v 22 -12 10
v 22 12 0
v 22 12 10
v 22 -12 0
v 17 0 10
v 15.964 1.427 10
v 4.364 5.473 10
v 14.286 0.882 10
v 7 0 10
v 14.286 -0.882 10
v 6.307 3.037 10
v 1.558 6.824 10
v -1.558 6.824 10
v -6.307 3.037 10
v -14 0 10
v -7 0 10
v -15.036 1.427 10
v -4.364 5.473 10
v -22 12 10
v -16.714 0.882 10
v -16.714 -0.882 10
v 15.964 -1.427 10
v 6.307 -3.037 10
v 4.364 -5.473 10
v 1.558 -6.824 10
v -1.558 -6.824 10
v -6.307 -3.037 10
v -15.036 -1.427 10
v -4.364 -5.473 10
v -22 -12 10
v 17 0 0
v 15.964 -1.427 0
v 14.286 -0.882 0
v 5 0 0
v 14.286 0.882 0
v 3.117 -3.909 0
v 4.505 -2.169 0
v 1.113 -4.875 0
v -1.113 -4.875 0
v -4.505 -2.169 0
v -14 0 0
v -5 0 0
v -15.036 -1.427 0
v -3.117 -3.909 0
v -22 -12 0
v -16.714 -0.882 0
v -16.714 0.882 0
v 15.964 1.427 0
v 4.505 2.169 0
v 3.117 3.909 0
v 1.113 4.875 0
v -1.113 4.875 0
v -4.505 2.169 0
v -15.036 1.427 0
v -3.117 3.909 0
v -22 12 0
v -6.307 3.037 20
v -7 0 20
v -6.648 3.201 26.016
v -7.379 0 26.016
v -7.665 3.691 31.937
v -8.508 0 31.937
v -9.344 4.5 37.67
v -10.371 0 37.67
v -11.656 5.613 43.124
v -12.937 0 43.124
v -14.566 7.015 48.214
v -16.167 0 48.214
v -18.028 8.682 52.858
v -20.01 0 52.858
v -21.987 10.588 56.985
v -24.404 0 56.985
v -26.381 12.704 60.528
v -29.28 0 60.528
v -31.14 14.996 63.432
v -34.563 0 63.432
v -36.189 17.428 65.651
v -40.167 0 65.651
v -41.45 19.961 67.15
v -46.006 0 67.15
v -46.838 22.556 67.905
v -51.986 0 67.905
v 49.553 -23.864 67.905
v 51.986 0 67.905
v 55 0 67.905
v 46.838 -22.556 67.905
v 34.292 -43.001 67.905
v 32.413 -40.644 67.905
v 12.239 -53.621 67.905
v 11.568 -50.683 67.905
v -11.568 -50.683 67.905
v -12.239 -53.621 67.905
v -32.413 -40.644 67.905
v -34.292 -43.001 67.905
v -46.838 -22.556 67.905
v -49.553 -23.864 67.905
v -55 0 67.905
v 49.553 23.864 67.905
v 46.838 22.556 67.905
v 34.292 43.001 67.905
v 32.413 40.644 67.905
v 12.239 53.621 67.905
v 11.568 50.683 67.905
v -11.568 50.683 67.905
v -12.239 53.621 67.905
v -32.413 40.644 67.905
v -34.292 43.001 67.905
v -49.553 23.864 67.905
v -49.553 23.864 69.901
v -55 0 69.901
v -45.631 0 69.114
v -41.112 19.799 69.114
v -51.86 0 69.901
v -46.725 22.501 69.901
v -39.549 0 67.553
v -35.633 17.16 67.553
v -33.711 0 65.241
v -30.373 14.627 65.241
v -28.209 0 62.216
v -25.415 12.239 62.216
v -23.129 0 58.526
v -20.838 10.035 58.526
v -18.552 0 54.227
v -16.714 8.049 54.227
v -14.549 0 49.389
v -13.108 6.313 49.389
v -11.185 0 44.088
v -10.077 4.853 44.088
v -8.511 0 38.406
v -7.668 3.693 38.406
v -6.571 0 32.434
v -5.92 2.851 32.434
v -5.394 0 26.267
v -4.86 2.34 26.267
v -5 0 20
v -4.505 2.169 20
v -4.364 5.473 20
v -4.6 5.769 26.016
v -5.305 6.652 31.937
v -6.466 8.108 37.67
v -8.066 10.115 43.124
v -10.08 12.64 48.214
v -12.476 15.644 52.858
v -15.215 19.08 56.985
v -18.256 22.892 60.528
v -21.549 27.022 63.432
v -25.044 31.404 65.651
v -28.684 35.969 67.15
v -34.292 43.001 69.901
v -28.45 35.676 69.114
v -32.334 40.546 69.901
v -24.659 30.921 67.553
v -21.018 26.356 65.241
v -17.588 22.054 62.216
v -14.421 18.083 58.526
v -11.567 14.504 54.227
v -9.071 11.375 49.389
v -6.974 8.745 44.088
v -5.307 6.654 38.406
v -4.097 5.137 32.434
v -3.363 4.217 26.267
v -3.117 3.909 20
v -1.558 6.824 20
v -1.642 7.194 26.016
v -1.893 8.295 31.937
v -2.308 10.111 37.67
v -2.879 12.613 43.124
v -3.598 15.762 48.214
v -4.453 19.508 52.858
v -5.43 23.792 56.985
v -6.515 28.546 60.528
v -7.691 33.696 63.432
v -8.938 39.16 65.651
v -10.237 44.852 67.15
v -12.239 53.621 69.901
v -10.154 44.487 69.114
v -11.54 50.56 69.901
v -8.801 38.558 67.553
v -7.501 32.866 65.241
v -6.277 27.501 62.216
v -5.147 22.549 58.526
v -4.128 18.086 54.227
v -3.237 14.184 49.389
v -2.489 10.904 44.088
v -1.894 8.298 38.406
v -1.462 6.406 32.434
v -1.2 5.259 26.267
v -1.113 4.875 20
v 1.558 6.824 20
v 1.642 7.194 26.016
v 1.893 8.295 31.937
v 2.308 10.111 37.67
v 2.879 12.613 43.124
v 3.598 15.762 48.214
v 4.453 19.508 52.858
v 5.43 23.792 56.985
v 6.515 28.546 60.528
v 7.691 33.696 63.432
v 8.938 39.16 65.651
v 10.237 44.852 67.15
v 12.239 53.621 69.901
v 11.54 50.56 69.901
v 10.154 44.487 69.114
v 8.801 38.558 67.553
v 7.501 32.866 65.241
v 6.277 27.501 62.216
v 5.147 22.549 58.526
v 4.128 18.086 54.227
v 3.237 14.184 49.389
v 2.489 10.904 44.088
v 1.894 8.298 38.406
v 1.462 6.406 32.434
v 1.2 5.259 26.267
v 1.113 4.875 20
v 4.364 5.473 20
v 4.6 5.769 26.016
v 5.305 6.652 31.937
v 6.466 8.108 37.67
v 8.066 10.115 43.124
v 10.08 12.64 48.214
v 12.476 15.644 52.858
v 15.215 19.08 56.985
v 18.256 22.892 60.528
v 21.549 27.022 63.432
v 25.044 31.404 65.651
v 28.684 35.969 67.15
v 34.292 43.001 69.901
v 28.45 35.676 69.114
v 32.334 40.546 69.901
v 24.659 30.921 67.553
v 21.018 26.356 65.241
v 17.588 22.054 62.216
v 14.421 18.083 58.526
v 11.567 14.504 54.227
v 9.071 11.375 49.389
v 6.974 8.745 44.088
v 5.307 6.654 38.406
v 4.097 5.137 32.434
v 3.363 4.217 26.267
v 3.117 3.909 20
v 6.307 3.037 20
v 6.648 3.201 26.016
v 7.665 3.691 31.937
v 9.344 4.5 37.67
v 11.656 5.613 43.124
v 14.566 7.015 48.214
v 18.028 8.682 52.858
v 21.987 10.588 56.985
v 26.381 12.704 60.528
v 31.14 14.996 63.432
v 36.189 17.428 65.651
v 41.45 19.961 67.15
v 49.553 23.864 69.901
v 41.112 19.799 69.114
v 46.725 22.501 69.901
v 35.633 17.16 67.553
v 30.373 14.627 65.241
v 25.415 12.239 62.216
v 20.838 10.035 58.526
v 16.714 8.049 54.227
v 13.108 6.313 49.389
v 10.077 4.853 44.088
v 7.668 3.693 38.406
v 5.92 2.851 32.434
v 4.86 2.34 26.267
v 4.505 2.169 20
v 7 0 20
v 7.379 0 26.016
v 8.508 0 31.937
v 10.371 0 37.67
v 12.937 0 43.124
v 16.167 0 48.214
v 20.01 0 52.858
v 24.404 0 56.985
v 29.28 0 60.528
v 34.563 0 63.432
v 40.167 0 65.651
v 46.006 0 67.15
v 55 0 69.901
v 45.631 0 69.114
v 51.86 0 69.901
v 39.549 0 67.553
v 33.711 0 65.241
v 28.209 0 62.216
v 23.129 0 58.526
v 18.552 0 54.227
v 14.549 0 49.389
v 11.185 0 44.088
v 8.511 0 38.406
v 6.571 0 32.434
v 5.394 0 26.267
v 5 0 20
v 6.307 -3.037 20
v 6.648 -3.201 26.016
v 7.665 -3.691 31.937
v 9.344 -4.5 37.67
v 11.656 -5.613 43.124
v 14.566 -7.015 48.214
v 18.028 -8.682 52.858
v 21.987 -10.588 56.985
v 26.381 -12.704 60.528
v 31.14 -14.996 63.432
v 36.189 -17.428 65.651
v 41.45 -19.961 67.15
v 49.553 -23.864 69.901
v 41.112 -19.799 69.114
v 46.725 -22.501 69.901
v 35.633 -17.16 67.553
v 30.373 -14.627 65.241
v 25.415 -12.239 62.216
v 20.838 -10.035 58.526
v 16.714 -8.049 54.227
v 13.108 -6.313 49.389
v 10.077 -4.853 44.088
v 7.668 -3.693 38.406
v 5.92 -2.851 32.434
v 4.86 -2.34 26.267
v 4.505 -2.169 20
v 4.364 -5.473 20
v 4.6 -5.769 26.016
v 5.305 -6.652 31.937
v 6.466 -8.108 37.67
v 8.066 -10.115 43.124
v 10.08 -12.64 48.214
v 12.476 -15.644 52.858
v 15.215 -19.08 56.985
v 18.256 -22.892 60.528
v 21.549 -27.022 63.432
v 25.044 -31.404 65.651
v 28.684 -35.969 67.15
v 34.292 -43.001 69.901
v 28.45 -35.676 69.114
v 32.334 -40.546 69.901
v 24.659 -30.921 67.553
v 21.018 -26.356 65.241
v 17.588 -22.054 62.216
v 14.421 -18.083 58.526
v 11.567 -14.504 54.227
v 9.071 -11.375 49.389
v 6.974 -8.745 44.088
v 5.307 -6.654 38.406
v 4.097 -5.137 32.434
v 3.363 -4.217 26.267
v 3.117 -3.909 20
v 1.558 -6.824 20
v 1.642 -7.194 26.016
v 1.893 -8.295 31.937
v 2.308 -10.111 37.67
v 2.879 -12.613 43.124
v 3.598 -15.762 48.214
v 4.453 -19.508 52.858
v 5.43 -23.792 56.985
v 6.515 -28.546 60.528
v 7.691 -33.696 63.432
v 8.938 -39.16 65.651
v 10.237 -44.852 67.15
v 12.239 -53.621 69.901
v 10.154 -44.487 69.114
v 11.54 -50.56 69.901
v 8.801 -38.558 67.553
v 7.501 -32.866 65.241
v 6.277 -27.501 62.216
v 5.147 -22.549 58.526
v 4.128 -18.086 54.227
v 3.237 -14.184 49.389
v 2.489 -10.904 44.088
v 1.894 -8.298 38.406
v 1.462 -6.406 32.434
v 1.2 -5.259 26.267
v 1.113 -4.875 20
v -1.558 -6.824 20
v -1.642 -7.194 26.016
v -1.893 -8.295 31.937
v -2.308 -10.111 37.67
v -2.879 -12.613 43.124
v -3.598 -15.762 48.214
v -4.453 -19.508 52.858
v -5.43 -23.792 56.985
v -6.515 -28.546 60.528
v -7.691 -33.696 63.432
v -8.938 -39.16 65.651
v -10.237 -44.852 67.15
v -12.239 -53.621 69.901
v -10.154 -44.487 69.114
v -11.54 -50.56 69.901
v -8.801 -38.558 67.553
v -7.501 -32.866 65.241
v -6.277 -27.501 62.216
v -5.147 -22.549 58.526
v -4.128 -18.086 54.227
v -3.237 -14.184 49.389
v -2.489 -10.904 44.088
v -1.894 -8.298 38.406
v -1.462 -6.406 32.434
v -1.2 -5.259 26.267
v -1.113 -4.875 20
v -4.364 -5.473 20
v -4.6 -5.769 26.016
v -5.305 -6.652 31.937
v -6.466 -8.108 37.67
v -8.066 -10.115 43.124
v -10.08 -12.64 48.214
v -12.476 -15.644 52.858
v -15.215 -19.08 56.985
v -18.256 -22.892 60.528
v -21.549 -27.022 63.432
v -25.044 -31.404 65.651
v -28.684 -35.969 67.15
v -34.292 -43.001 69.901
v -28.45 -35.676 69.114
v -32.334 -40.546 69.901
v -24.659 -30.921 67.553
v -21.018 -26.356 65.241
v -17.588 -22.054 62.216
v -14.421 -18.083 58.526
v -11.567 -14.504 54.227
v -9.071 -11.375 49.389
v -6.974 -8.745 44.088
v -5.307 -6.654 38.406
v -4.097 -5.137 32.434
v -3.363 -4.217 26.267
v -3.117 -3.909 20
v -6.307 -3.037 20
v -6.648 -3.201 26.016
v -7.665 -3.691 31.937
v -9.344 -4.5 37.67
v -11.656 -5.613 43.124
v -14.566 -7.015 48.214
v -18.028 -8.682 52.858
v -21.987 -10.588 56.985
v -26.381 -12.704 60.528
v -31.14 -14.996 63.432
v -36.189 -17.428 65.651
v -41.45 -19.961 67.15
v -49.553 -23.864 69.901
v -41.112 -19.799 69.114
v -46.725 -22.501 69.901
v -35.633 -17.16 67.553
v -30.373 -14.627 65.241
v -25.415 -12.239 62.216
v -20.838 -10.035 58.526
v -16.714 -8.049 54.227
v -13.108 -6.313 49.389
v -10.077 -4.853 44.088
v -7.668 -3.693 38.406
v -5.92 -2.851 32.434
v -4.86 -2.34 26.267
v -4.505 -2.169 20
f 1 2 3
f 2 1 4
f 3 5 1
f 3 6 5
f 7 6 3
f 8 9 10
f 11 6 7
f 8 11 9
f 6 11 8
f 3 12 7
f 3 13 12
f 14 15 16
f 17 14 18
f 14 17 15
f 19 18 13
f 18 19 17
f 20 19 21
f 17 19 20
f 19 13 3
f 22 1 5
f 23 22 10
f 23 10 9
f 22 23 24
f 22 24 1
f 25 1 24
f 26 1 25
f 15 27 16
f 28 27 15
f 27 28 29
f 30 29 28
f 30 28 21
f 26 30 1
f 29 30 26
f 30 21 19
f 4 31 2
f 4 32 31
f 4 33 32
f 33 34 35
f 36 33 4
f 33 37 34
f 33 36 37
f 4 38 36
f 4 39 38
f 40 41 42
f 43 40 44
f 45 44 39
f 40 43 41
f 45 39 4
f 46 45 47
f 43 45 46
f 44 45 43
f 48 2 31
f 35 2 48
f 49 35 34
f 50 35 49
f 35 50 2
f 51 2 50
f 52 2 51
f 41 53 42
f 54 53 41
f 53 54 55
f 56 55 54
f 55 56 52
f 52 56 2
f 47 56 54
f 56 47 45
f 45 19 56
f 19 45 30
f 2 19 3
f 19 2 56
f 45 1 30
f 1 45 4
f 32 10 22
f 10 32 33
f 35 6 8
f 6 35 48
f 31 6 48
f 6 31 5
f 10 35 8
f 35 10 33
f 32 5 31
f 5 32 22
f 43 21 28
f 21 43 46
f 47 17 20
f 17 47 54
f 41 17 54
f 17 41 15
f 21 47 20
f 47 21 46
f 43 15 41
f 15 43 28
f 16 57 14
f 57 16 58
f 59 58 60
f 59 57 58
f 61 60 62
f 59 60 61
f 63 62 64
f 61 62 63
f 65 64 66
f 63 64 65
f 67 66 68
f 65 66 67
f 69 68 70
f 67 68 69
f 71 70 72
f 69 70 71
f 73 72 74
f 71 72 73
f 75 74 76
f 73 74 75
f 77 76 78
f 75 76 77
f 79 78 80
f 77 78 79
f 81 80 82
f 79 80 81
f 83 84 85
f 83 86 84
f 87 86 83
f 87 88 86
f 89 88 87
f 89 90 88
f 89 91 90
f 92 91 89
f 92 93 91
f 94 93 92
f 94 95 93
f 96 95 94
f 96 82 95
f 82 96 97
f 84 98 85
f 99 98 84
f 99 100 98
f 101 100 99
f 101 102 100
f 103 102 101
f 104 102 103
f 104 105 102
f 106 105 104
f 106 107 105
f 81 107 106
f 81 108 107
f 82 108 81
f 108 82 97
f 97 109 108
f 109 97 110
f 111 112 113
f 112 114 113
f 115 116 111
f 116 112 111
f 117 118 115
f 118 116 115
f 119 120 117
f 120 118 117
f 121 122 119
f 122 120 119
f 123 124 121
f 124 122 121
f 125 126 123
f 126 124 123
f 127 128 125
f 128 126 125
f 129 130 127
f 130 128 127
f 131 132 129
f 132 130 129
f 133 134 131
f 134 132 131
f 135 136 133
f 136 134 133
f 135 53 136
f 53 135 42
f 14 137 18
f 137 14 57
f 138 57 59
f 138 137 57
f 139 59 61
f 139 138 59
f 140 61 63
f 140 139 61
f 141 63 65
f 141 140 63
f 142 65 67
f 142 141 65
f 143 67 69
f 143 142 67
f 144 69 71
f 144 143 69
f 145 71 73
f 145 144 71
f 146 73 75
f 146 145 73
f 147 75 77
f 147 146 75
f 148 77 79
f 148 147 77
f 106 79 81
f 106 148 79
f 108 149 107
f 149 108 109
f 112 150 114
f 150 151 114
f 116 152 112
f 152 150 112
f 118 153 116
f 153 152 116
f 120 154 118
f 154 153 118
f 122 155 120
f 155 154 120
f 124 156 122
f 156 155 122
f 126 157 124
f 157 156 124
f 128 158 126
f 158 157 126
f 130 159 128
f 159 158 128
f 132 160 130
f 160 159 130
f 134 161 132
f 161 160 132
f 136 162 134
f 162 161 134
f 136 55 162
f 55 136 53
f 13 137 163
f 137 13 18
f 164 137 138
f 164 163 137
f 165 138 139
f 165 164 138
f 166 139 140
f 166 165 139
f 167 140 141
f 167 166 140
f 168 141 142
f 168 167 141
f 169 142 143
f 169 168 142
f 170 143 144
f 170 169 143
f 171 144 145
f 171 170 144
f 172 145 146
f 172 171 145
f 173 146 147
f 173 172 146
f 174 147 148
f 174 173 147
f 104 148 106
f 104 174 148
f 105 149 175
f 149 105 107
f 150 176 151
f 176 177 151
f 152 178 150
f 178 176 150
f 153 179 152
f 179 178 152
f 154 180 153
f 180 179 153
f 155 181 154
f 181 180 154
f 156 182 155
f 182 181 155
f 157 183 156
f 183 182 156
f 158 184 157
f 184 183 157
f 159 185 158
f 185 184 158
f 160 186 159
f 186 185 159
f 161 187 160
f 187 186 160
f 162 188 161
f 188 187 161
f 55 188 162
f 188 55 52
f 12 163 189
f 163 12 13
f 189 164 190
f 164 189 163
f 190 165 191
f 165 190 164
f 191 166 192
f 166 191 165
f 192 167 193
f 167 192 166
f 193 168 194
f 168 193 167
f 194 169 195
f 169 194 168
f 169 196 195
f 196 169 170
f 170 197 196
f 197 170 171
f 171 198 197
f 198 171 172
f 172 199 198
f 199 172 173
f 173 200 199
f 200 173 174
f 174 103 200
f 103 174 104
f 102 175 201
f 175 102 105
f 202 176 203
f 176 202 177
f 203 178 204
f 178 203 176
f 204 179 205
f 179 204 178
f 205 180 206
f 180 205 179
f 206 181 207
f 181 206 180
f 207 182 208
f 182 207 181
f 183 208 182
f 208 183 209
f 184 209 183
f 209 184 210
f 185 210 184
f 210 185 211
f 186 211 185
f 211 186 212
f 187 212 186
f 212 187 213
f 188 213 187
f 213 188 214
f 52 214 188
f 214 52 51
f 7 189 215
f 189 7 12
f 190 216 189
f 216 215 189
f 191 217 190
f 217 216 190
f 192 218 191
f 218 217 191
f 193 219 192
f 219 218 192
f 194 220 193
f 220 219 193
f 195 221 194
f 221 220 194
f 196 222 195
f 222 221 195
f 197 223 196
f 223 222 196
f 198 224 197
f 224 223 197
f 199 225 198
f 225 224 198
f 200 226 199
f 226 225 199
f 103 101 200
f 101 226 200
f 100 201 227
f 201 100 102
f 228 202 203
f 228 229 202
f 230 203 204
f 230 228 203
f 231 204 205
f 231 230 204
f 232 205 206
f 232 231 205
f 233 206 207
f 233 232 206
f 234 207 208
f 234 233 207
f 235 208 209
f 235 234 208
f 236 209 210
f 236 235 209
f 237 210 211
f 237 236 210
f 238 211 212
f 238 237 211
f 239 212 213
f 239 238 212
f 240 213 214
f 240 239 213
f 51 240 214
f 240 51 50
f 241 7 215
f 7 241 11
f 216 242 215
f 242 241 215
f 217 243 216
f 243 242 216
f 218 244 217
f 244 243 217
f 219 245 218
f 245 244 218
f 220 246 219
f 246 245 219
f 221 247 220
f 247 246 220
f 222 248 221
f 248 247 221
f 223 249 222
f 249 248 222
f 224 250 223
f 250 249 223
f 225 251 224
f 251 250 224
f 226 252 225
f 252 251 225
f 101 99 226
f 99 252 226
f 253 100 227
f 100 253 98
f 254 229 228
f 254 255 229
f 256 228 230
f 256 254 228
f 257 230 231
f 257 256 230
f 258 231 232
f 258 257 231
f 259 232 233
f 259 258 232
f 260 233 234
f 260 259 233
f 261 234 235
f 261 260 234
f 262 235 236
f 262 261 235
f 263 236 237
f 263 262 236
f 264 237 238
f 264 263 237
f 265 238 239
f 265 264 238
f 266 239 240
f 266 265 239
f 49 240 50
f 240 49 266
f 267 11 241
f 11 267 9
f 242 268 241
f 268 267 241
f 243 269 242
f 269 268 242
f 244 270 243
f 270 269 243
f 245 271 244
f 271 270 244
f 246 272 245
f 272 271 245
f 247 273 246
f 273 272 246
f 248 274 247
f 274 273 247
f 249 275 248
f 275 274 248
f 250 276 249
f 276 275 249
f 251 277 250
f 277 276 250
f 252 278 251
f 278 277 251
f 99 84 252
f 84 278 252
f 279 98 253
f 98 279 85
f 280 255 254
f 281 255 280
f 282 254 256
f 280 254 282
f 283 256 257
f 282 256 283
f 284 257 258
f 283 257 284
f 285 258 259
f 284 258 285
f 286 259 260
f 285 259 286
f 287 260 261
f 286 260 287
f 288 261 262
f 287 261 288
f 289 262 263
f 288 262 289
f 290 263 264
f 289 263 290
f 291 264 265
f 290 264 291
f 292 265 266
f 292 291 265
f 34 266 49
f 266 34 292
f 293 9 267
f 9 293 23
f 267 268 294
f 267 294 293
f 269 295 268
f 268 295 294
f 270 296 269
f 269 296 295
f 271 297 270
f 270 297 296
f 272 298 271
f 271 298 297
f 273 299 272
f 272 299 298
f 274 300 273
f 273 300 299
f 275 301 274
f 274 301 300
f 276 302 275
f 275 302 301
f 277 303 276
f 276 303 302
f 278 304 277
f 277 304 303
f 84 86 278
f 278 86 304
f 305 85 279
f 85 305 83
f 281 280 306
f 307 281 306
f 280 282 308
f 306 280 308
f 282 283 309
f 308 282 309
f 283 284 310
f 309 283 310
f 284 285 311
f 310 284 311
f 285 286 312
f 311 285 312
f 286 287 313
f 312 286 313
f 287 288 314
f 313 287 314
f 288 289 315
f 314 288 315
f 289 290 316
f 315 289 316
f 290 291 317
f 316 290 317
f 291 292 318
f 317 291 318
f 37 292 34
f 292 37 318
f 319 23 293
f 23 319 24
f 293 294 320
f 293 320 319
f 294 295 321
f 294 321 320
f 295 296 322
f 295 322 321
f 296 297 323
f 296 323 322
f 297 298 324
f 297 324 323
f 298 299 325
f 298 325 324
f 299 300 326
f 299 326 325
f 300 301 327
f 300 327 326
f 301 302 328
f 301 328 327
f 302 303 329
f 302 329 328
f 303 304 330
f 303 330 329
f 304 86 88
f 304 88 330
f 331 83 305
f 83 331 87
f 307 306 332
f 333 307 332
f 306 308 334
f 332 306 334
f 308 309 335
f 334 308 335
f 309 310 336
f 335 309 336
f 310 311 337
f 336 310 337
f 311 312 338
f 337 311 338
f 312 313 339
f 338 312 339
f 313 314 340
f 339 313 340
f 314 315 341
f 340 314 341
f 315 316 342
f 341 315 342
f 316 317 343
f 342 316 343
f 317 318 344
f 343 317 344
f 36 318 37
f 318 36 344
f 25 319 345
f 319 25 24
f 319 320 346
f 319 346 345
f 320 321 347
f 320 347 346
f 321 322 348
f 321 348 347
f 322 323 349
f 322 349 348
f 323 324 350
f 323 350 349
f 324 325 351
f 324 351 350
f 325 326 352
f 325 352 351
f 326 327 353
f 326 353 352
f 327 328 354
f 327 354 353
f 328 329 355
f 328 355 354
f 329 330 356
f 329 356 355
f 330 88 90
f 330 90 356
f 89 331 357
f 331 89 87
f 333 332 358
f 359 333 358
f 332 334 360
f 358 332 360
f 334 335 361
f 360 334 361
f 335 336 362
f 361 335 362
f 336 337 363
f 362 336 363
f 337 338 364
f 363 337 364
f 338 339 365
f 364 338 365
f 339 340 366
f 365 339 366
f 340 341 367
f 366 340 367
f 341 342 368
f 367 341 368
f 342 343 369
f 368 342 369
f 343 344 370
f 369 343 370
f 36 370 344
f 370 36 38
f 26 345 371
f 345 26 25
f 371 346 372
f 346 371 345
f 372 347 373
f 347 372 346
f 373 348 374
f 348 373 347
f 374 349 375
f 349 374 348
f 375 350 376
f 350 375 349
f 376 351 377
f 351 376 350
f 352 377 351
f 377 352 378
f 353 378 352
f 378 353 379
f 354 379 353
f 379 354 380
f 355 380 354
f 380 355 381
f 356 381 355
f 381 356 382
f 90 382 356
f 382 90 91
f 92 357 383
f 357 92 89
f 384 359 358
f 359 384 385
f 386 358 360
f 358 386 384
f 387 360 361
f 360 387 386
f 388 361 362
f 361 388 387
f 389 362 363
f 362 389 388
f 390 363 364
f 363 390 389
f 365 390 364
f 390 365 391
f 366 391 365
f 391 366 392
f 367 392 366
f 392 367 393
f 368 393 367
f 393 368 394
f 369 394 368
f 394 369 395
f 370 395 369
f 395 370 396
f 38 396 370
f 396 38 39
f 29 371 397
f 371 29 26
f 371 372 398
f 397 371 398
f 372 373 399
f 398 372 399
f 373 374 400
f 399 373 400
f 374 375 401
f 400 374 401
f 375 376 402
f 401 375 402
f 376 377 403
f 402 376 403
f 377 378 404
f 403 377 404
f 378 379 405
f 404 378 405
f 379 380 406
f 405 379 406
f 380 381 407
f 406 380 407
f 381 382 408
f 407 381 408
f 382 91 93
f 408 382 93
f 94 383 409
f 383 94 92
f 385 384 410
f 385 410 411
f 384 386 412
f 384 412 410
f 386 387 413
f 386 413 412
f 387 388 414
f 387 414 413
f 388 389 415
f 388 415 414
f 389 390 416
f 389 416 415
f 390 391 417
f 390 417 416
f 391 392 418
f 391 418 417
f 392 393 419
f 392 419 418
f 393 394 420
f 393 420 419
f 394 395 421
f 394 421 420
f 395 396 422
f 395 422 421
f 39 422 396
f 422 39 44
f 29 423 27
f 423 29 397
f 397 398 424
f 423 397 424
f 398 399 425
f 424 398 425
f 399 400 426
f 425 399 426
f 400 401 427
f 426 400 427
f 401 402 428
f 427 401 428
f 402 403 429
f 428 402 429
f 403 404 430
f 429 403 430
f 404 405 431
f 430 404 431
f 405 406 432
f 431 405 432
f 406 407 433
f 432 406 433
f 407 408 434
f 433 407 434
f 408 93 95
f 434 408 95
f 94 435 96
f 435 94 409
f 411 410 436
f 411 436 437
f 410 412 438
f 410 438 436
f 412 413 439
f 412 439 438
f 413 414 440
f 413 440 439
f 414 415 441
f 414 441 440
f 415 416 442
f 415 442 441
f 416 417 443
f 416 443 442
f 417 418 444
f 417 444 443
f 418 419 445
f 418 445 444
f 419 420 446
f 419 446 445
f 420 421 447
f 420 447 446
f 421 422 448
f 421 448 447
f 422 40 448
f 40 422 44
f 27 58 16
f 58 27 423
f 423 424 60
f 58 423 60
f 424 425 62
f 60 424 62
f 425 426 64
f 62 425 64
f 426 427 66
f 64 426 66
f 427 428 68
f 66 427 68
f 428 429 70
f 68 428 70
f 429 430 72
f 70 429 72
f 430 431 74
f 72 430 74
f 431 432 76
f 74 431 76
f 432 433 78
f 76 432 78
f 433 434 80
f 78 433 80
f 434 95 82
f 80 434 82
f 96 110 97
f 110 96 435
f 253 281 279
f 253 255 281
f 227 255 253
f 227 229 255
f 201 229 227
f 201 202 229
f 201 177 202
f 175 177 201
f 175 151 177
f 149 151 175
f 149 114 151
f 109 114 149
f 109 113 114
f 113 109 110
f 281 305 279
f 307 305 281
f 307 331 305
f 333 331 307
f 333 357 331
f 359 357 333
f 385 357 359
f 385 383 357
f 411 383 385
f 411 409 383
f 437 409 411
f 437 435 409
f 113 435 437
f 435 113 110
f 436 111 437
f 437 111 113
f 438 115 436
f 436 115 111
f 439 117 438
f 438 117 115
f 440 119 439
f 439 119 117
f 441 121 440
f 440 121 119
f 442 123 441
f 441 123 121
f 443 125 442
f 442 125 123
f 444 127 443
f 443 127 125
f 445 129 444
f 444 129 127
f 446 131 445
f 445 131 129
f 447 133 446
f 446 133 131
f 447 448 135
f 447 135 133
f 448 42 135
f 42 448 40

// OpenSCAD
// file: variables_artificial_flower.scad
//----------------------------//
// Flower-Corolla
r_nectory = 5;
l_flower = 50;
thick_flower = 2;
l_additional_corolla_pipe = 20; // including base

fn_corolla_pelets = 14;
fn_petels_surface = 50;

// base
h_base = 10;
w_base = 2*(r_nectory+thick_flower) + 10 ;
l_base_thread = 2*(r_nectory+thick_flower) + 30;
d_thread = 3;
offset_thread = 5;

//----------------------------//
// Tube parameters
r_tube = 4;
r_tube_top = 6;
h_tube_top = 1;
// main file
include <variables_artificial_flower.scad>;

// Print Flower
rotate_extrude($fn = fn_corolla_pelets) // 360 degree rotate
{
    //corolla
    translate([l_flower+r_nectory, l_additional_corolla_pipe, 0])
    difference(){
        circle(r = l_flower, $fn = fn_petels_surface, center = true); // outer layer
        circle(r = (l_flower-thick_flower) , $fn = fn_petels_surface, center = true); // inner layer
        // remove 3/4 of the circle
        polygon( points=[[0,0], [0,l_flower], [l_flower,l_flower], 
        [l_flower,-l_flower], [-l_flower,-l_flower], [-l_flower, 0]]);
    }
    //additional-pipe
    translate([r_nectory, 0, 0])
    square([thick_flower,l_additional_corolla_pipe]);
}

// Flower-base
difference(){
translate([0, 0, h_base/2])
cube([l_base_thread,w_base,h_base], center=true);
translate([0, 0, -1])
cylinder(r=r_nectory+1, h=h_base+2);
//Screw +x
translate([l_base_thread/2 - d_thread/2 - offset_thread , 0, -1])
cylinder(r=d_thread/2, h=h_base+2);
//Screw -x
translate([-(l_base_thread/2 - d_thread/2 - offset_thread), 0, -1])
cylinder(r=d_thread/2., h=h_base+2);
}
